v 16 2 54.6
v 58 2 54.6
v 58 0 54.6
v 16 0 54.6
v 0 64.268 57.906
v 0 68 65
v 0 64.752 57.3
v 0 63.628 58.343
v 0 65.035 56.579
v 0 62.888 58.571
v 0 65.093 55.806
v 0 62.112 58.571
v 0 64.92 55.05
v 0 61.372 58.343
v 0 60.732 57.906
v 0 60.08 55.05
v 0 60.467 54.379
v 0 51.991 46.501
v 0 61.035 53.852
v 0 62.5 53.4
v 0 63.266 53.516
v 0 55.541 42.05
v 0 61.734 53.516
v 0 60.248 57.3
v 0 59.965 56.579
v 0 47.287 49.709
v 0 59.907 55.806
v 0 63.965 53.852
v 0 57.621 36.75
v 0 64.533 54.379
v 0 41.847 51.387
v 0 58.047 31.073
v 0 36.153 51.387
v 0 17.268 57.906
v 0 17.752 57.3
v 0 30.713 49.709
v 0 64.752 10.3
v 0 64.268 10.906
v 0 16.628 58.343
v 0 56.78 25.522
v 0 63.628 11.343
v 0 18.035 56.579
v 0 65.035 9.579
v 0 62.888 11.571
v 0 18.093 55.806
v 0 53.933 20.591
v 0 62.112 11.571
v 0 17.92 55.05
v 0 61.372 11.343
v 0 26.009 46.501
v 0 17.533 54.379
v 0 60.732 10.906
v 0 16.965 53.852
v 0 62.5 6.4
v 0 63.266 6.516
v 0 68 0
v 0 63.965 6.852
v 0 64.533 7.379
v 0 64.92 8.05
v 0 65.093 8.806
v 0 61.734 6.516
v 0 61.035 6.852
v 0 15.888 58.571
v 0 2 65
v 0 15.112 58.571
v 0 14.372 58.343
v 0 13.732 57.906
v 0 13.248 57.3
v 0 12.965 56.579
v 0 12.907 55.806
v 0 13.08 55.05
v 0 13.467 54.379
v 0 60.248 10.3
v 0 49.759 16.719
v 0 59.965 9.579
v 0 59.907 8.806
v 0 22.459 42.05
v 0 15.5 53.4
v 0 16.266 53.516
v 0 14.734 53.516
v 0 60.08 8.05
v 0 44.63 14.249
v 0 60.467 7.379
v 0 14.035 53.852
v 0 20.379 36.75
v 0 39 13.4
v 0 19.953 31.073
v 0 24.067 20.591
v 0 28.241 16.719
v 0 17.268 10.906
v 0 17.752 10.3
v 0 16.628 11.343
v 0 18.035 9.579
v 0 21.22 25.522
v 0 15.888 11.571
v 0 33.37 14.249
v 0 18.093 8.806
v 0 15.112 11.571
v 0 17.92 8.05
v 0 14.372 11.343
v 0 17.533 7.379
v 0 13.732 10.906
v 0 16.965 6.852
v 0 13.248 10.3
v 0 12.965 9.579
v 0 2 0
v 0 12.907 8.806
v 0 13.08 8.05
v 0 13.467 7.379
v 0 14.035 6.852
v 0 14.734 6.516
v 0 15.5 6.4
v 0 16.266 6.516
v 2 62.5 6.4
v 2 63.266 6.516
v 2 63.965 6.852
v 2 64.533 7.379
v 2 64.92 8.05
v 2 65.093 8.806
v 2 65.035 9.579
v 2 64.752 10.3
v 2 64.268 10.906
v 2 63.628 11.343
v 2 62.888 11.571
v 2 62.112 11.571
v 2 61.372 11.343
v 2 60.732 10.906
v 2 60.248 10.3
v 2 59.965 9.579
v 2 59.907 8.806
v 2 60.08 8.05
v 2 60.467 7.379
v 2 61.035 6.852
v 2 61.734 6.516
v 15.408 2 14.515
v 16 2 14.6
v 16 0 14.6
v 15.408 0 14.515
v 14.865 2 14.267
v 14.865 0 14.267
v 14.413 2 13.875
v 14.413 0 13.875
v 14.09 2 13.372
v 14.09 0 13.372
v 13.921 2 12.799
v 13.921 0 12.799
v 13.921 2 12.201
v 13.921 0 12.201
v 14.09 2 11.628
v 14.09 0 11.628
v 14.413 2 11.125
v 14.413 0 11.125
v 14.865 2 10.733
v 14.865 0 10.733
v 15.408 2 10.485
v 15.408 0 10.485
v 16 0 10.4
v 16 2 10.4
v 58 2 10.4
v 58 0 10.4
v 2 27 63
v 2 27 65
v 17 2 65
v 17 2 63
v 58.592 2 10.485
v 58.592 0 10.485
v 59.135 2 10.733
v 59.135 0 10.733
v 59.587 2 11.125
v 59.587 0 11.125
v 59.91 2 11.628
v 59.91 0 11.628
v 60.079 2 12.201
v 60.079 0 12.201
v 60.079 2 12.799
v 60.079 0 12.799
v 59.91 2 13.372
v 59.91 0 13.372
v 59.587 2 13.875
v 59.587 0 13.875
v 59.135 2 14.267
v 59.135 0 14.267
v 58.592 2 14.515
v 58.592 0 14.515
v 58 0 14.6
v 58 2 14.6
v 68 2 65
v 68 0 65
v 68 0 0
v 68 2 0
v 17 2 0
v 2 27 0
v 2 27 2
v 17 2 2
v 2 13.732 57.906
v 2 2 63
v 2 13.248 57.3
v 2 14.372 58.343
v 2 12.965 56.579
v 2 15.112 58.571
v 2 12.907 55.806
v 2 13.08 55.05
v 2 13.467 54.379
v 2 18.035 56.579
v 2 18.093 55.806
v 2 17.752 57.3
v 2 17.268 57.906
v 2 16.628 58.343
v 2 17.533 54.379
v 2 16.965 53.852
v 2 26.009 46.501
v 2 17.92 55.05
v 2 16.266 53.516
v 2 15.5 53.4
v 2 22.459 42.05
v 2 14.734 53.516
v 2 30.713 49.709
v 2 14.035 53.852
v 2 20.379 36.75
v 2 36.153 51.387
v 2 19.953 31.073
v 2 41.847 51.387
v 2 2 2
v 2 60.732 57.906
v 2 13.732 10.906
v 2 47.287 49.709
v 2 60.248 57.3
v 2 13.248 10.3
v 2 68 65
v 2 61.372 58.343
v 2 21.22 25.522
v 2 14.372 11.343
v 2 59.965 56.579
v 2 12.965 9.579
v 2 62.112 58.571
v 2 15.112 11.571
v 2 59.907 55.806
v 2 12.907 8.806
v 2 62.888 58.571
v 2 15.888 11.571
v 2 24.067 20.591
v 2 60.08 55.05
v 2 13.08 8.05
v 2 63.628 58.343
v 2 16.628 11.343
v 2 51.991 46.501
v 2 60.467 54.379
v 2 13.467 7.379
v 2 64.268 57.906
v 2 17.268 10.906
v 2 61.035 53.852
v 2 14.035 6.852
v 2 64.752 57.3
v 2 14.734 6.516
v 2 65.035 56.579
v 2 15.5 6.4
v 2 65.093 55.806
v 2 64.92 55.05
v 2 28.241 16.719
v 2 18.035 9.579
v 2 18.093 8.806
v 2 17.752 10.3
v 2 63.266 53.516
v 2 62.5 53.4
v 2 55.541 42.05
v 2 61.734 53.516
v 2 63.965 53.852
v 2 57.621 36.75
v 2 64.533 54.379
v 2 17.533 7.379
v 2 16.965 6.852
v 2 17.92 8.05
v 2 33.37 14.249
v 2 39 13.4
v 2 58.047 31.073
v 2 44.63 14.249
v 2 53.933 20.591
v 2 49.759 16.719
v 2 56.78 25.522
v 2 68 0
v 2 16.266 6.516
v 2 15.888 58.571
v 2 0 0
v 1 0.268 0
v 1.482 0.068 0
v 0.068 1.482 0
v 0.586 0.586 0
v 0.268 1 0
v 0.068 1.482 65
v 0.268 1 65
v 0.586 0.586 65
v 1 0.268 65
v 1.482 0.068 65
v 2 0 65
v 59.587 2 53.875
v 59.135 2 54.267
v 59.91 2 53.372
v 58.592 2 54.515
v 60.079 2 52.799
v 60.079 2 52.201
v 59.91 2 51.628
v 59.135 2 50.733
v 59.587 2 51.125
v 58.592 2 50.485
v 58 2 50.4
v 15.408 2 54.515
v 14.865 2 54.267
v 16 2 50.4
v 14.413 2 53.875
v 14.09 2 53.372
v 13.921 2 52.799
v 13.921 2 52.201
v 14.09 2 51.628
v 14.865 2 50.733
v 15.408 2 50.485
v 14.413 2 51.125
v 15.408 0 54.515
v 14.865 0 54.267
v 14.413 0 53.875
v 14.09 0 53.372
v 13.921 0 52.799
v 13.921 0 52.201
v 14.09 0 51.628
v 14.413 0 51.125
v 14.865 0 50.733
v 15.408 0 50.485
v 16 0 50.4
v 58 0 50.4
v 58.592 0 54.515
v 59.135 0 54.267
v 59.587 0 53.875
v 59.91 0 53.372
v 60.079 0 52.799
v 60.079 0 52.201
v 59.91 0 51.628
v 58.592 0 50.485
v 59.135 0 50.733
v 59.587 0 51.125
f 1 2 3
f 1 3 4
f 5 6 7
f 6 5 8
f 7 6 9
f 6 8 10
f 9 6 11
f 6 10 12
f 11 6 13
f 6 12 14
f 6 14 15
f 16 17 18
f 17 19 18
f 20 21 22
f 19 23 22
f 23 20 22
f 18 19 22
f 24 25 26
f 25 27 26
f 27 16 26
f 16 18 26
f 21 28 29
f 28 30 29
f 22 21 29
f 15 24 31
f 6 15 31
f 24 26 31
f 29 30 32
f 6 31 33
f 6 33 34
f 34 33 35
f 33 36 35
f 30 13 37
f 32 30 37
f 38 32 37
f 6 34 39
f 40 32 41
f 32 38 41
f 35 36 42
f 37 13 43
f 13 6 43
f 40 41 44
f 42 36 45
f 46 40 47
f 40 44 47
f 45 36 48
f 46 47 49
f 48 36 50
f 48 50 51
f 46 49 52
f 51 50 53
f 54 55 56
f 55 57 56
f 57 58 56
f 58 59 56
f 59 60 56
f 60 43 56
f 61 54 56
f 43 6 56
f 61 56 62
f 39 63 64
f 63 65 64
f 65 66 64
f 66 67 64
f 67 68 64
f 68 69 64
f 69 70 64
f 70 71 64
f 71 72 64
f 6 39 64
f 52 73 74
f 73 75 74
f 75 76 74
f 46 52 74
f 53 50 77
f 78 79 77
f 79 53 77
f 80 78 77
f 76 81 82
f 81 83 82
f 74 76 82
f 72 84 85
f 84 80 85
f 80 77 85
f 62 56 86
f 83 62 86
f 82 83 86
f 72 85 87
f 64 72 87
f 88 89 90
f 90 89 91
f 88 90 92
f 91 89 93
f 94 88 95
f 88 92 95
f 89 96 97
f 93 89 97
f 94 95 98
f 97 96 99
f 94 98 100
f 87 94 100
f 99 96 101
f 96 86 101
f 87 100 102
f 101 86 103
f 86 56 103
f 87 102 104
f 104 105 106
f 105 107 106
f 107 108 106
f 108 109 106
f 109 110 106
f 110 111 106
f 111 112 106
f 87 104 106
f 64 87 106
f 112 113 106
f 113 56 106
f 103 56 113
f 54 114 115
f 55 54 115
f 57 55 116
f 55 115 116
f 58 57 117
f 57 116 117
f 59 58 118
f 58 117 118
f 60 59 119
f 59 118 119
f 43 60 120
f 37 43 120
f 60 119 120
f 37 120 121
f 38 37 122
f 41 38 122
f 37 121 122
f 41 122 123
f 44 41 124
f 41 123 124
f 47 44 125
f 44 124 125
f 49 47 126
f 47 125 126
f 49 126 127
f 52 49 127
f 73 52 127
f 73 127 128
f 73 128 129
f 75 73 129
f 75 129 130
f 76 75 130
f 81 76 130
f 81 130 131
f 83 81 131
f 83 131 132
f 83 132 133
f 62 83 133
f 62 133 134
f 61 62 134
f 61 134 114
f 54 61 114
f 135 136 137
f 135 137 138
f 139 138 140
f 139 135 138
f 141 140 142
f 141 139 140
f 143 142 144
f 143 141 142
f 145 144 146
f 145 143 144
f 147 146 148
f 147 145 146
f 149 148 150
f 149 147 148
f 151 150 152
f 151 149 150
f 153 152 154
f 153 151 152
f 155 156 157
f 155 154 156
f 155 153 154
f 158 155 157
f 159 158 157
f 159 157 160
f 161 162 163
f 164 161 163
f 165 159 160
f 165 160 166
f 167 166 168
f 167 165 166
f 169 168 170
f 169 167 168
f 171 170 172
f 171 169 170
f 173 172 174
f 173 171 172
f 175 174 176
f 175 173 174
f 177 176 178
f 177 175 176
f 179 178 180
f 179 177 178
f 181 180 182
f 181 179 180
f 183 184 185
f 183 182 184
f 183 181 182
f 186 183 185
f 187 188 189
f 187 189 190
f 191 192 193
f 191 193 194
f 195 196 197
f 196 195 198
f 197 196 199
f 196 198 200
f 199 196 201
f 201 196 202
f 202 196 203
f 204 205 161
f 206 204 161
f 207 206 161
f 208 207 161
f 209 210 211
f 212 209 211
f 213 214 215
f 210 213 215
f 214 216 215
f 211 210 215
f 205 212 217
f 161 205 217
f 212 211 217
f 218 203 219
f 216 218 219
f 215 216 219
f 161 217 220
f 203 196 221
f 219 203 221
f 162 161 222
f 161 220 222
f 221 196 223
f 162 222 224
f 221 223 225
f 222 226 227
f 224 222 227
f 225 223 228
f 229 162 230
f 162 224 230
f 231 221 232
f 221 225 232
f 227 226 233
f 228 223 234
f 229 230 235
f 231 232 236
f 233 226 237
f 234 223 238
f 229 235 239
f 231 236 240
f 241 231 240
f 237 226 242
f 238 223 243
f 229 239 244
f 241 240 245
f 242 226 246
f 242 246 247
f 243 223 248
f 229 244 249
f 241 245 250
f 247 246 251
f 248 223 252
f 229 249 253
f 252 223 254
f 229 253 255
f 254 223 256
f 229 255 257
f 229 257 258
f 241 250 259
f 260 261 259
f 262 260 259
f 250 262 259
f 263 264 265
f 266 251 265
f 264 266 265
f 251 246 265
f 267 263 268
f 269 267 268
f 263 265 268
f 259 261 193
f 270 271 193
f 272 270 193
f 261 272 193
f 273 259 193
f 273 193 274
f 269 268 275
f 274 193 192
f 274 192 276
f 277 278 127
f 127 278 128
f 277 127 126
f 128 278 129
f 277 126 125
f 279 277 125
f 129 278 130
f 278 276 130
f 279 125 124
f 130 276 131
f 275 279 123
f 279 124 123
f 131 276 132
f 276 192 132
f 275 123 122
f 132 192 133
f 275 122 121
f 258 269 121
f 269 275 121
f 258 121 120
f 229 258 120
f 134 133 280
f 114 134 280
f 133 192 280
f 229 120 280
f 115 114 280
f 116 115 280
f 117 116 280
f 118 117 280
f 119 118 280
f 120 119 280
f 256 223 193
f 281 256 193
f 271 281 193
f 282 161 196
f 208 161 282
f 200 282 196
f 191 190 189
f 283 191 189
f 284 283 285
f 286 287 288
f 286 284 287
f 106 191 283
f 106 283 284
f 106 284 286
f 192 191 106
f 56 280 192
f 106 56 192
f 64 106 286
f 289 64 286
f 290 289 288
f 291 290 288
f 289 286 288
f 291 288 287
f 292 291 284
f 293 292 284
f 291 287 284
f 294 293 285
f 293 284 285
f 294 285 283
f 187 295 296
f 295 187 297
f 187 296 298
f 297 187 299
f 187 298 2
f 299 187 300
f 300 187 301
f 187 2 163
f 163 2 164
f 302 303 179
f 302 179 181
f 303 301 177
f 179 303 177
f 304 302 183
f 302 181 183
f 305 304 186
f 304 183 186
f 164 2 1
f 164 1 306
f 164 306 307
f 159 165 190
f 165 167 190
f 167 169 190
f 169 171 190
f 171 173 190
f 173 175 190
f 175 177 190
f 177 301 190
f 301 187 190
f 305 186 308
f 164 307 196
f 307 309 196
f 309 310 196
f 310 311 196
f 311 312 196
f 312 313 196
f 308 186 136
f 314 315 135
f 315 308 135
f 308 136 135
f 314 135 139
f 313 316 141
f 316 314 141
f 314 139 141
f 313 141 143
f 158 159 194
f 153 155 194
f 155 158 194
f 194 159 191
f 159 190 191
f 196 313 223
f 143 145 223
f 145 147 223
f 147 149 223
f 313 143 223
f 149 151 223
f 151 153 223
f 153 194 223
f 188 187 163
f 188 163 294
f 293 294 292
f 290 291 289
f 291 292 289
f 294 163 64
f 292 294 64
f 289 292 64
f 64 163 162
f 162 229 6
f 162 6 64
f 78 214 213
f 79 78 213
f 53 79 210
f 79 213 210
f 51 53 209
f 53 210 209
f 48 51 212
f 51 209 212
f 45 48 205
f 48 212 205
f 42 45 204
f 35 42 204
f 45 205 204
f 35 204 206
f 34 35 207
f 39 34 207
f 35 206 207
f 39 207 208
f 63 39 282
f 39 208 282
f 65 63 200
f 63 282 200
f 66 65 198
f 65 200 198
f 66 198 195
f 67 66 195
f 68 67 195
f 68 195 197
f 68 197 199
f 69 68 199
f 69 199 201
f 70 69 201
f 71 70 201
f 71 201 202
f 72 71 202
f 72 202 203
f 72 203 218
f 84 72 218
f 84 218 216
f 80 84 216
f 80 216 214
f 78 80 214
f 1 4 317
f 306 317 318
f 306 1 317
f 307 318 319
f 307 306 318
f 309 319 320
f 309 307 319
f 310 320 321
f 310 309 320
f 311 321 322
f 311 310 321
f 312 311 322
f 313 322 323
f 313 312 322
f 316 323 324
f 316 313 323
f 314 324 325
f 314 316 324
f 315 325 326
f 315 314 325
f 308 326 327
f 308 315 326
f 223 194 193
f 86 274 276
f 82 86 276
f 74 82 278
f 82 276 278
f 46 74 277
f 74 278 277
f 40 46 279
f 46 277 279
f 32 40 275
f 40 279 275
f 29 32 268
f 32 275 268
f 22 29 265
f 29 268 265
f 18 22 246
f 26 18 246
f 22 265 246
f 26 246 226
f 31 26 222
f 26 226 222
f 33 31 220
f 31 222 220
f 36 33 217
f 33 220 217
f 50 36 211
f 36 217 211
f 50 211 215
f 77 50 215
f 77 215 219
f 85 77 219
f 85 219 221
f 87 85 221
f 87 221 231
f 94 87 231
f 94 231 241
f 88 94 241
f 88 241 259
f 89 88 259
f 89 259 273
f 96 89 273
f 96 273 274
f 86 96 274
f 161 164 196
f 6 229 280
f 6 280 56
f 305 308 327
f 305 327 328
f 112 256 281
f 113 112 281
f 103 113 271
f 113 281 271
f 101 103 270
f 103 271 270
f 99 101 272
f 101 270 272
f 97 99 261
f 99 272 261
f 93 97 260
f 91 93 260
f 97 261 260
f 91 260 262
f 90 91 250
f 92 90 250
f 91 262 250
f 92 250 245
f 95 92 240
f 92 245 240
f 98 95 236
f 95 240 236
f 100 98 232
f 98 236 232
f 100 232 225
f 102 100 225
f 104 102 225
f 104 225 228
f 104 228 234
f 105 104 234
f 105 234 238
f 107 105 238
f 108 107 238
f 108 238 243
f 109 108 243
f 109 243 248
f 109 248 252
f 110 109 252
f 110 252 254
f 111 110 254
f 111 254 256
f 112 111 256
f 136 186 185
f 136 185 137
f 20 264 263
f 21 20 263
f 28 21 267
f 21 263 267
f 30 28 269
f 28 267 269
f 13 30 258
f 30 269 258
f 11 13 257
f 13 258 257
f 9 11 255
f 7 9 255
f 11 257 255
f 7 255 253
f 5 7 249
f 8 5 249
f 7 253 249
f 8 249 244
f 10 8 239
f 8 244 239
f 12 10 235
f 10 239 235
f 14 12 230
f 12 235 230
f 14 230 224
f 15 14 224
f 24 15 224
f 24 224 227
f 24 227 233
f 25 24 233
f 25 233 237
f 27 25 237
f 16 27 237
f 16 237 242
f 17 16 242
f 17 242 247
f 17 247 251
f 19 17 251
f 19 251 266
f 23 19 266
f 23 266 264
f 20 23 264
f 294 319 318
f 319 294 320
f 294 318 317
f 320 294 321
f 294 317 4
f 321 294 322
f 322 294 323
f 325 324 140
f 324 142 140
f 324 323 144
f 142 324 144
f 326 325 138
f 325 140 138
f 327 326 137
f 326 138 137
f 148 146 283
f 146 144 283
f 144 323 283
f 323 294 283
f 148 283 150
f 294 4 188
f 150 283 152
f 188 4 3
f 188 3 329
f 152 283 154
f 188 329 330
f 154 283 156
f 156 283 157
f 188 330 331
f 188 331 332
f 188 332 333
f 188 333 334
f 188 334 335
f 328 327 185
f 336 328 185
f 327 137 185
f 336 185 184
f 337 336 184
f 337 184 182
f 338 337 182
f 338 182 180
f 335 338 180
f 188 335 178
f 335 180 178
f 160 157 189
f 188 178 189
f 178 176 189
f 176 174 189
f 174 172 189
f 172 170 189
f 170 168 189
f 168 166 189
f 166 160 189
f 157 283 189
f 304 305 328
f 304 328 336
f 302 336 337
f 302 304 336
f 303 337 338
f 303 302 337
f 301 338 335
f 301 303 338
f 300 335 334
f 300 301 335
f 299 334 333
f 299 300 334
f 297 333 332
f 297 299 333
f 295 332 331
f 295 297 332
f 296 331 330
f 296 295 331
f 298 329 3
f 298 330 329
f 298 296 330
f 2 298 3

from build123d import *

# Parameters (mm, degrees)
EXTRUDE_1_DEPTH     = 65
SKETCH_2_R          = 19.1
SKETCH_2_R_2        = 2.6
CUT_EXTRUDE_1_DEPTH = 3
CUT_EXTRUDE_2_DEPTH = 3
EXTRUDE_2_DEPTH     = 2
EXTRUDE_3_DEPTH     = 2


with BuildPart() as part:
    # Эскиз1 → Бобышка-Вытянуть1 (new body)
    with BuildSketch(Plane.XY):
        with BuildLine():
            Line((2, 0), (68, 0))
            Line((68, 0), (68, 2))
            Line((68, 2), (2, 2))
            Line((2, 2), (2, 68))
            Line((2, 68), (0, 68))
            Line((0, 68), (0, 2))
            ThreePointArc((0, 2), (0.585786438, 0.585786438), (2, 0))
        make_face()
    extrude(amount=EXTRUDE_1_DEPTH)

    # Эскиз2 → Вырез-Вытянуть1 (cut, through all)
    with BuildSketch(Plane(origin=(2, 0, 0), x_dir=(0, 0, -1), z_dir=(1, 0, 0))):
        with Locations((-32.5, 39)):
            Circle(SKETCH_2_R)
        with Locations((-9, 62.5)):
            Circle(SKETCH_2_R_2)
        with Locations((-9, 15.5)):
            Circle(SKETCH_2_R_2)
        with Locations((-56, 15.5)):
            Circle(SKETCH_2_R_2)
        with Locations((-56, 62.5)):
            Circle(SKETCH_2_R_2)
    extrude(amount=-CUT_EXTRUDE_1_DEPTH, mode=Mode.SUBTRACT)

    # Эскиз3 → Вырез-Вытянуть2 (cut, through all)
    with BuildSketch(Plane(origin=(0, 2, 0), x_dir=(1, 0, 0), z_dir=(0, 1, 0))):
        with BuildLine():
            Line((16, -10.4), (58, -10.4))
            ThreePointArc((58, -10.4), (60.1, -12.5), (58, -14.6))
            Line((58, -14.6), (16, -14.6))
            ThreePointArc((16, -14.6), (13.9, -12.5), (16, -10.4))
        make_face()
        with BuildLine():
            Line((16, -50.4), (58, -50.4))
            ThreePointArc((58, -50.4), (60.1, -52.5), (58, -54.6))
            Line((58, -54.6), (16, -54.6))
            ThreePointArc((16, -54.6), (13.9, -52.5), (16, -50.4))
        make_face()
    extrude(amount=-CUT_EXTRUDE_2_DEPTH, mode=Mode.SUBTRACT)

    # Эскиз4 → Бобышка-Вытянуть2 (add)
    with BuildSketch(Plane.XY.offset(65)):
        Polygon((2, 27), (17, 2), (2, 2), align=None)
    extrude(amount=-EXTRUDE_2_DEPTH)

    # Эскиз5 → Бобышка-Вытянуть3 (add)
    with BuildSketch(Plane(origin=(0, 0, 0), x_dir=(-1, 0, 0), z_dir=(0, 0, -1))):
        Polygon((-2, 27), (-17, 2), (-2, 2), align=None)
    extrude(amount=-EXTRUDE_3_DEPTH)


solid = part.part
